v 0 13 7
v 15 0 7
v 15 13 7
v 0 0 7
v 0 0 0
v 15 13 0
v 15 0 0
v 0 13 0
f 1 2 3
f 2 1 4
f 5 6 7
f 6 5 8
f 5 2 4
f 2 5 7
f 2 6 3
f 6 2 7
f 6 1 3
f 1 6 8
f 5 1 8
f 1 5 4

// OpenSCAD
// Generated by SolidPython 1.0.1 on 2020-07-29 00:46:55


cube(size = [15, 13, 7]);
/***********************************************
*********      SolidPython code:      **********
************************************************
 
# import packages: SolidPython
from solid import *
from solid.utils import *
from itertools import chain, combinations, permutations


class Resize:

    def __init__(self, scad_file):
        self.scad_file = scad_file
        #self.scad_file = import_scad(scad_file)
        # cone/cylinder param:
        self.r1 = 0
        self.r2 = 0
        self.h = 0
        # rectangular prism param:
        self.w = 0
        self.l = 0
        # ellipse param:
        self.r = 0

    # import OpenScad code (file name corresponds to shape)


    # classify shape + parameters
    def assign(self, param1, param2, param3):
        if self.scad_file == 'cone.scad':
            self.r1 = param1
            self.r2 = param2
            self.h = param3
        elif self.scad_file == 'cylinder.scad':
            self.r1 = param1
            self.r2 = param2
            self.h = param3
        elif self.scad_file == 'rectangularPrism.scad':
            self.h = param1
            self.l = param2
            self.w = param3
        else:
            self.r = param1
            self.h = param2

    # resize parameters
    def iterate(self):
        x = range(3, 20, 2)
        i = 1
        if self.scad_file == 'cone.scad':
            tempList = list(permutations(x, 2))
            for temp in tempList:
                param1 = temp[0]
                param2 = temp[1]
                filepath = 'produced_scad_files/' + 'cone' + str(param1) + '_' + str(param2) + '_' + '.scad'
                scad_render_to_file(cylinder(h=param1, r1=param2, r2=0), filepath)

        elif self.scad_file == 'cylinder.scad':
            tempList = list(permutations(x, 3))
            for temp in tempList:
                param1 = temp[0]
                param2 = temp[1]
                filepath = 'produced_scad_files/' + 'cylinder' + str(param1) + '_' + str(param2) + '_' + '.scad'
                scad_render_to_file(cylinder(h=param1, r1=param2, r2=param2), filepath)

        elif self.scad_file == 'rectangularPrism.scad':
            tempList = list(permutations(x, 3))
            for temp in tempList:
                param1 = temp[0]
                param2 = temp[1]
                param3 = temp[2]
                filepath = 'produced_scad_files/' + 'rectangularPrism' + str(param1) + '_' + str(param2) + '_' + str(
                    param3) + '.scad'
                scad_render_to_file(cube(size=(param1, param2, param3)), filepath)

        elif self.scad_file == 'ellipse.scad':
            tempList = list(permutations(x, 4))
            for temp in tempList:
                param1 = temp[0]
                param2 = temp[1]
                param3 = temp[2]
                param4 = temp[3]
                filepath = 'produced_scad_files/' + 'ellipse' + str(param1) + '_' + str(param2) + '_' + str(param3) + '_' + str(param4) + '.scad'
                scad_render_to_file(scale([param1, param2, param3])(sphere(r=param4)), filepath)

    def render_to_scadfile(self):
        scad_render_to_file(scad, 'example.scad') 
 
************************************************/
